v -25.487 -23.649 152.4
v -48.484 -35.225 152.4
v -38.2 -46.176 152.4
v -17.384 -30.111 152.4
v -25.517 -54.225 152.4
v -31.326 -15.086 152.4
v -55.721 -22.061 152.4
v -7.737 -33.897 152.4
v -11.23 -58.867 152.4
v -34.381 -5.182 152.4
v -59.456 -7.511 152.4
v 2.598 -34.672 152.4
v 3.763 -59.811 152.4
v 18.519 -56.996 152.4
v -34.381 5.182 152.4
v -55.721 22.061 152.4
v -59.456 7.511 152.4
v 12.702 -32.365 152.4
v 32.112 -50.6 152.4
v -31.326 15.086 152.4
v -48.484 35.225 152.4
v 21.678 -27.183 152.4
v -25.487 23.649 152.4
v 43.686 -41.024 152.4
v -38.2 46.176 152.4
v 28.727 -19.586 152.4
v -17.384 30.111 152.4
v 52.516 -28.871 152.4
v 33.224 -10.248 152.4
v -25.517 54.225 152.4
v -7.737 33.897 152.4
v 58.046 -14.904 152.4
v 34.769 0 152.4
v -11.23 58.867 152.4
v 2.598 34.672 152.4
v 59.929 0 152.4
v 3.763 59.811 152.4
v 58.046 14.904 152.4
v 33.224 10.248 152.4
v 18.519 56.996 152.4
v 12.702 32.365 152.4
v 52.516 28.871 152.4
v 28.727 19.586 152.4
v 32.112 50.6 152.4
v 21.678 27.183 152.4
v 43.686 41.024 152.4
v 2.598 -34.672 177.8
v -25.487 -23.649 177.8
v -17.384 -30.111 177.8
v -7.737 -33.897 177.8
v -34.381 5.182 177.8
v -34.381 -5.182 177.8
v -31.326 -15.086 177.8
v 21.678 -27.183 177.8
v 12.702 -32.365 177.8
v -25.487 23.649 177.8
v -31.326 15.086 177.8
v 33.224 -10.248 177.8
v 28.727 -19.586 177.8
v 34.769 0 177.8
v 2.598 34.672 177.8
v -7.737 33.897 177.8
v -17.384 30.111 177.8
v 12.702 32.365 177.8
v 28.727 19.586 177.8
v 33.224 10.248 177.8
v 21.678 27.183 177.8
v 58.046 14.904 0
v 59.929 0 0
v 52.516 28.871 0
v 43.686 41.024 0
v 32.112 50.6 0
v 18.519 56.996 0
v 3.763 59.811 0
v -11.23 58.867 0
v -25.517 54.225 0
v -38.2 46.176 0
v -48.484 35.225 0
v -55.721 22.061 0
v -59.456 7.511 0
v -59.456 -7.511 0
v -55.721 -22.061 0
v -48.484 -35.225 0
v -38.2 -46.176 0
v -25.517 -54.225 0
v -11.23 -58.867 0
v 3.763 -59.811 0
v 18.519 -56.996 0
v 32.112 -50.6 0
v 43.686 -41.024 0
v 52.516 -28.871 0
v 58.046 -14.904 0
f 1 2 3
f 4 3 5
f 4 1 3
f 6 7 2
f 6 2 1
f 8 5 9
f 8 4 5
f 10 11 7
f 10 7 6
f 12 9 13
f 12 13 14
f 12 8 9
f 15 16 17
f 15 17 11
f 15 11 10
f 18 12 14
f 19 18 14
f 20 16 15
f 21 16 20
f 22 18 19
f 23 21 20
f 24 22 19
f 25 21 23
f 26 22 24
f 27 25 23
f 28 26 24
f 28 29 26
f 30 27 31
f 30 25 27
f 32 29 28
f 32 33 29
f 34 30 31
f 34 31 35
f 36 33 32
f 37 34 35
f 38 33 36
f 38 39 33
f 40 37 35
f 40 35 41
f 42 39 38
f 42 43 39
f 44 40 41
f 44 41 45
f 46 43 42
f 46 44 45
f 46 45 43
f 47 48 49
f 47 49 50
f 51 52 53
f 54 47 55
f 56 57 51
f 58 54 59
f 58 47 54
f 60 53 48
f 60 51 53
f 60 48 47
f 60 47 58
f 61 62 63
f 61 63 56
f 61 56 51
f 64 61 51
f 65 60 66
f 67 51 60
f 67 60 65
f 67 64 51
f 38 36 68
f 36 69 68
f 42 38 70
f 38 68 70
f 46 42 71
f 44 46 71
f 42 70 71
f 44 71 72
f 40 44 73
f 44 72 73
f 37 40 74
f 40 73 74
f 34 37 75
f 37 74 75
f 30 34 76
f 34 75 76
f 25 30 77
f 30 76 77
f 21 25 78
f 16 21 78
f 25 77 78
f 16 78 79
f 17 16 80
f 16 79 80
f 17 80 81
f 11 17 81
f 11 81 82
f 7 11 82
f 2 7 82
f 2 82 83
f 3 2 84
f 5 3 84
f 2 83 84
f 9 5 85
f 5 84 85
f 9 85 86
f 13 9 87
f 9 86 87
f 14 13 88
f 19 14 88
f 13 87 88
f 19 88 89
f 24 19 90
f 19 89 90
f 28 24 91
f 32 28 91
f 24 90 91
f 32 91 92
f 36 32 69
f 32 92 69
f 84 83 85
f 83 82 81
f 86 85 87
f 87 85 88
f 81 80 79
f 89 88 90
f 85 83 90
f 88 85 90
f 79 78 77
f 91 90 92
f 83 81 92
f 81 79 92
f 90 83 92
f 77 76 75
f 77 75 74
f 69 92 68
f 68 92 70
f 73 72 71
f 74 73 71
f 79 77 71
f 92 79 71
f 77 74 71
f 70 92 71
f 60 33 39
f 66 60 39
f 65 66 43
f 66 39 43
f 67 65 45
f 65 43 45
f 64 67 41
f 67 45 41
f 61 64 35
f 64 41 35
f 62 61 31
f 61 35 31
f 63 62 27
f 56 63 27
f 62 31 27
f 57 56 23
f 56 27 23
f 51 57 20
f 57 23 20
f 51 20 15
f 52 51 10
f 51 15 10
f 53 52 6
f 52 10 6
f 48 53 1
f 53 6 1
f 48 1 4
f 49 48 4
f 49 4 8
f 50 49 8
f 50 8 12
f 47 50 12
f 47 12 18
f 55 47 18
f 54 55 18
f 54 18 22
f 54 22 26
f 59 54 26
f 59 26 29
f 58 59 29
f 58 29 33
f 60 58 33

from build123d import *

# Parameters (mm, degrees)
F0_R     = 59.9289623747
F0_R_2   = 51.785848785
F1_DEPTH = 127
F3_DEPTH = 101.6
F4_DEPTH = 127
F5_R     = 34.7688744337
F6_DEPTH = 177.8


with BuildPart() as f1:
    # F0 (on Top) → F1 (new body)
    with BuildSketch(Plane.XY):
        Circle(F0_R)
        Circle(F0_R_2, mode=Mode.SUBTRACT)
        Circle(F0_R_2)
    extrude(amount=F1_DEPTH)

    # F3 (cut): a face of the model
    f3_faces = [f1.faces().sort_by_distance(p)[0] for p in [
        (0, 0, 127),
    ]]
    extrude(f3_faces, amount=-F3_DEPTH, mode=Mode.SUBTRACT)

    # F4 (add): a face of the model
    f4_faces = [f1.faces().sort_by_distance(p)[0] for p in [
        (0, 0, 25.4),
    ]]
    extrude(f4_faces, amount=F4_DEPTH)

    # F5 (on Top) → F6 (join)
    with BuildSketch(Plane.XY):
        Circle(F5_R)
    extrude(amount=F6_DEPTH)


solid = f1.part
